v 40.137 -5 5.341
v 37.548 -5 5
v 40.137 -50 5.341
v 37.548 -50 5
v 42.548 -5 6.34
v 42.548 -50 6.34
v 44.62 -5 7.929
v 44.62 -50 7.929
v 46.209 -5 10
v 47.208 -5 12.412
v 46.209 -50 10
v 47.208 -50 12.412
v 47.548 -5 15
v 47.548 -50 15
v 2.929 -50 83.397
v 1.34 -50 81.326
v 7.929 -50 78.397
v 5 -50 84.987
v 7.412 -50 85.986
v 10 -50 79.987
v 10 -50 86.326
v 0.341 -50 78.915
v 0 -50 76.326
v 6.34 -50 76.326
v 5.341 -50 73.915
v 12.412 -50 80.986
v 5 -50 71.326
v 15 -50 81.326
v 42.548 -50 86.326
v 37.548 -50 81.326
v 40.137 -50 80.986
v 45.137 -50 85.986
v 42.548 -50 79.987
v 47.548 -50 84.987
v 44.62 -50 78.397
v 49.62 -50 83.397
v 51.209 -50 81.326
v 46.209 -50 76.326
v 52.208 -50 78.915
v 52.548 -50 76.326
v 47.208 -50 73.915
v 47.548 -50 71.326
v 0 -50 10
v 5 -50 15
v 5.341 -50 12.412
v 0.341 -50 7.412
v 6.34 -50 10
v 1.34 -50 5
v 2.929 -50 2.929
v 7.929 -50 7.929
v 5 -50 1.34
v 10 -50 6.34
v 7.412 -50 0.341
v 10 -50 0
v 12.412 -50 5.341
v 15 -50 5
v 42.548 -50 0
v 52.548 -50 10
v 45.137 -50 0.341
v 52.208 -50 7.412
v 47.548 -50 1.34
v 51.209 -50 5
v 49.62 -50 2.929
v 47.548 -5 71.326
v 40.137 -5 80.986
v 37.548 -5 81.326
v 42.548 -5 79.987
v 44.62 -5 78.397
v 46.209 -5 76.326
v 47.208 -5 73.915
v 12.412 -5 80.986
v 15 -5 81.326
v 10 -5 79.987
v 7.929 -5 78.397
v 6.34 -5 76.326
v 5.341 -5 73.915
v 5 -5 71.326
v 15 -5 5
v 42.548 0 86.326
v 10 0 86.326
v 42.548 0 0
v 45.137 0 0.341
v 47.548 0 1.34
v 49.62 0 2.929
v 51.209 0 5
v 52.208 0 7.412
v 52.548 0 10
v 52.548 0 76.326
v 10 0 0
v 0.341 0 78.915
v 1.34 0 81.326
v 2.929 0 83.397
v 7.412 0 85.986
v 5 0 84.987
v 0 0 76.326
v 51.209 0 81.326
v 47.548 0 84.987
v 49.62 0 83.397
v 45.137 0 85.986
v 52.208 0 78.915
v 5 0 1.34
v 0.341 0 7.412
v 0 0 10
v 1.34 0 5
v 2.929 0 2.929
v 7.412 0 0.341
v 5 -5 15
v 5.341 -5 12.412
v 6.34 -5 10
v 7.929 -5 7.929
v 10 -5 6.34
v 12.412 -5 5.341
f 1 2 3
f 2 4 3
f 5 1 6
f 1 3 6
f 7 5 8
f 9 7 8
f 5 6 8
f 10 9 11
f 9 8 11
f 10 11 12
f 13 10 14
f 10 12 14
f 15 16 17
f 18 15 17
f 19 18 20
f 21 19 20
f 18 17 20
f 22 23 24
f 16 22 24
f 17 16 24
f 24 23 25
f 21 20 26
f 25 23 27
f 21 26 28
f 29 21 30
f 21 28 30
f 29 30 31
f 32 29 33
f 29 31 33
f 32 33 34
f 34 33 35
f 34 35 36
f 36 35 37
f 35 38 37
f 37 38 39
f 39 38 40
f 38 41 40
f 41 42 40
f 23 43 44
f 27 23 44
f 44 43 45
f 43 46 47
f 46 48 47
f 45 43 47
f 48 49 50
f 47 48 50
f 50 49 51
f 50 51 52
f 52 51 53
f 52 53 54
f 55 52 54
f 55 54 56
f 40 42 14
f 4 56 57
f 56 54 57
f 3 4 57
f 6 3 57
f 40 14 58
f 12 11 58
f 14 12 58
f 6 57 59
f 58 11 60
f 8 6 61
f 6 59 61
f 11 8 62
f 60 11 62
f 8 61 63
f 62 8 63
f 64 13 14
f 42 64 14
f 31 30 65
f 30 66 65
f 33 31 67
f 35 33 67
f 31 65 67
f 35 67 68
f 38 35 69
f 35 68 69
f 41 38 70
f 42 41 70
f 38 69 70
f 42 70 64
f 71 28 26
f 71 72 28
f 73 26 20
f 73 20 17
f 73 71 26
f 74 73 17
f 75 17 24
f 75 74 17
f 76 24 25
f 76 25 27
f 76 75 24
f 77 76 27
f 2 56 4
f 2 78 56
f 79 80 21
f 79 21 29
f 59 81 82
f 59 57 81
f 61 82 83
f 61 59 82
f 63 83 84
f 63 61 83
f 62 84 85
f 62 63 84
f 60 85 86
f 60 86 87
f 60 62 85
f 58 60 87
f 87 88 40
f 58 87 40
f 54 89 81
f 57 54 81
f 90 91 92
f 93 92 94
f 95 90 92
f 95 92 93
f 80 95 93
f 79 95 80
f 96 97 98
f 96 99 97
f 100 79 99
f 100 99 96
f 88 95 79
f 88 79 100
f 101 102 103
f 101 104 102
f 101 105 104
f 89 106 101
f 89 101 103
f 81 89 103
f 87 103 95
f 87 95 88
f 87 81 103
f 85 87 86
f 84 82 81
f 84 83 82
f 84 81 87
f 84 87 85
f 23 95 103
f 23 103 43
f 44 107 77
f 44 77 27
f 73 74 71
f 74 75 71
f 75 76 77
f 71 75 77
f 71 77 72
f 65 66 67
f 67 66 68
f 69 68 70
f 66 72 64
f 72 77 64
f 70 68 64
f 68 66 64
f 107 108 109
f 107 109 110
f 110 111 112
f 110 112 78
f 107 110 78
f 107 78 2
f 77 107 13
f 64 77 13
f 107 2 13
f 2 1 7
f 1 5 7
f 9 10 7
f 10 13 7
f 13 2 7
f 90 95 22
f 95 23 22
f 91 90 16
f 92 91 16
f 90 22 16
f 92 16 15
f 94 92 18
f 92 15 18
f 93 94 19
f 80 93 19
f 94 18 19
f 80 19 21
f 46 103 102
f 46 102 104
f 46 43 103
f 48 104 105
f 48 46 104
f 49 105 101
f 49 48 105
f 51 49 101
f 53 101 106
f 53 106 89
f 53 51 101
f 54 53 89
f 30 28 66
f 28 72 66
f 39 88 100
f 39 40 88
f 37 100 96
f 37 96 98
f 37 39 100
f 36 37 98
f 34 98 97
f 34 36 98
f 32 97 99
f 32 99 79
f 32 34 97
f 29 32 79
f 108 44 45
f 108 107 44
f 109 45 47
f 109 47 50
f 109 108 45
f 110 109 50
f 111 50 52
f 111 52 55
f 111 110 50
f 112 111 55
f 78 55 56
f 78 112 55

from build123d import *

# Parameters (mm, degrees)
F0_W     = 52.5484979153
F0_H     = 51.326431334
F1_DEPTH = 50
F2_DEPTH = 35
F3_T     = -5
F4_R     = 10
F5_R     = 10


with BuildPart() as f1:
    # F0 (on Front) → F1 (new body)
    with BuildSketch(Plane.XZ):
        with Locations((26.2742489576, 25.663215667)):
            Rectangle(F0_W, F0_H)
    extrude(amount=F1_DEPTH)

    # F2 (add): a face of the model
    f2_faces = [f1.faces().sort_by_distance(p)[0] for p in [
        (26.2742489576, -25, 51.326431334),
    ]]
    extrude(f2_faces, amount=F2_DEPTH)

    # F3
    f3_openings = [f1.faces().sort_by_distance(p)[0] for p in [
        (26.274249, -50, 43.163216),
    ]]
    offset(amount=F3_T, openings=f3_openings)

    # F4
    f4_edges = [f1.edges().sort_by_distance(p)[0] for p in [
        (0, -25, 0),
        (52.548498, -25, 0),
        (0, -25, 86.326431),
        (52.548498, -25, 86.326431),
    ]]
    fillet(f4_edges, radius=F4_R)

    # F5
    f5_edges = [f1.edges().sort_by_distance(p)[0] for p in [
        (5, -27.5, 5),
        (47.548498, -27.5, 5),
        (47.548498, -27.5, 81.326431),
        (5, -27.5, 81.326431),
    ]]
    fillet(f5_edges, radius=F5_R)


solid = f1.part
